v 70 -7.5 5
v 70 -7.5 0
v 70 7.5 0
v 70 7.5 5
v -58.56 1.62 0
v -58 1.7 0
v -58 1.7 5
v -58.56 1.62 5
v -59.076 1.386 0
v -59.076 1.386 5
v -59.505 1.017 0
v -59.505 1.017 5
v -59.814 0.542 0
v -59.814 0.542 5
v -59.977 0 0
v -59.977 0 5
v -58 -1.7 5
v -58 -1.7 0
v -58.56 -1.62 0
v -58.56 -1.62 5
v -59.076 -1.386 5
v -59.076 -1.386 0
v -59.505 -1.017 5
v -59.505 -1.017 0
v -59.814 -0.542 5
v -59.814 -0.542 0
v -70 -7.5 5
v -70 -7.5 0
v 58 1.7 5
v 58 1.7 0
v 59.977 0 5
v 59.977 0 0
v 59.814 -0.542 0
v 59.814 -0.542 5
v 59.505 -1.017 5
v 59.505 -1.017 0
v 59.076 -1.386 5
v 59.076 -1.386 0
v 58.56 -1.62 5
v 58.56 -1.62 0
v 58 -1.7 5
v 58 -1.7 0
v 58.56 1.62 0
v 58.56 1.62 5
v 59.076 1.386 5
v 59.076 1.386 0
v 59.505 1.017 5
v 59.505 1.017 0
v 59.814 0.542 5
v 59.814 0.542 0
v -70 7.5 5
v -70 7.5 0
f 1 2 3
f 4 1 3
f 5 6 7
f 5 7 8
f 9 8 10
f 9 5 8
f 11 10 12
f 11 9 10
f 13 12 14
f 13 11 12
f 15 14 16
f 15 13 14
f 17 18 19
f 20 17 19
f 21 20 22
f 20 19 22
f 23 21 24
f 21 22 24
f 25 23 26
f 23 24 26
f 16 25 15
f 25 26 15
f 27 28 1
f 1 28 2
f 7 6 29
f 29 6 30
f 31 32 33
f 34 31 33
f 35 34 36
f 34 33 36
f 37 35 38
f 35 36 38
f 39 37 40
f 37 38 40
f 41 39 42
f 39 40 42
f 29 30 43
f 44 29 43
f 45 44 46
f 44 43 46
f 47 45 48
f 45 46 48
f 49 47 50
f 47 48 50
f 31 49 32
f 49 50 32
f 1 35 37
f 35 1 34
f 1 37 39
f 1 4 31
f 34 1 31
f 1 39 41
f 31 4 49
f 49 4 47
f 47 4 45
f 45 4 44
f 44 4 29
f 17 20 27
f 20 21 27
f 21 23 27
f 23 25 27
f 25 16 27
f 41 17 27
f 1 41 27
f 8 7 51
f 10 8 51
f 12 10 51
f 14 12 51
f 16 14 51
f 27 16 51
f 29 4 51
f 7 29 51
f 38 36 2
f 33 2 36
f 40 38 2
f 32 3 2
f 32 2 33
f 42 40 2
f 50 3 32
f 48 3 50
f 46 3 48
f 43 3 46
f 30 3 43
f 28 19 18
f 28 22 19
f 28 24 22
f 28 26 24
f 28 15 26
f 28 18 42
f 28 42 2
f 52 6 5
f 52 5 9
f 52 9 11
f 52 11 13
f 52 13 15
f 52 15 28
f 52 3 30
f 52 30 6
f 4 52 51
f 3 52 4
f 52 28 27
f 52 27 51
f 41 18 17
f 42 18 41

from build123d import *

# Parameters (mm, degrees)
F0_W        = 140
F0_H        = 15
F0_W_2      = 120
F0_H_2      = 3.4
F1_DEPTH    = 5
F2_T1_DEPTH = 5


# Not quite as in the source:
# - a fillet or chamfer that OpenCascade refuses, or shapes differently, is made with other operations: its cross-section is extruded or revolved along the edge and cut away or added


with BuildPart() as f1:
    # F0 (on Top) → F1 (new body)
    with BuildSketch(Plane.XY):
        Rectangle(F0_W, F0_H)
        Rectangle(F0_W_2, F0_H_2, mode=Mode.SUBTRACT)
    extrude(amount=F1_DEPTH)

    # F2: fillet of radius 2 on 4 edges, made by hand

    # F2_s2 → F2_t1 (join)
    with BuildSketch(Plane.XY):
        with BuildLine():
            ThreePointArc((-58, 1.7), (-59.4142135624, 1.1142135624), (-60, -0.3))
            Line((-60, -0.3), (-60, 1.7))
            Line((-60, 1.7), (-58, 1.7))
        make_face()
        with BuildLine():
            ThreePointArc((-58, -1.7), (-59.4142135624, -1.1142135624), (-60, 0.3))
            Line((-60, 0.3), (-60, -1.7))
            Line((-60, -1.7), (-58, -1.7))
        make_face()
        with BuildLine():
            ThreePointArc((58, 1.7), (59.4142135624, 1.1142135624), (60, -0.3))
            Line((60, -0.3), (60, 1.7))
            Line((60, 1.7), (58, 1.7))
        make_face()
        with BuildLine():
            ThreePointArc((60, 0.3), (59.4142135624, -1.1142135624), (58, -1.7))
            Line((58, -1.7), (60, -1.7))
            Line((60, -1.7), (60, 0.3))
        make_face()
    extrude(amount=F2_T1_DEPTH)


solid = f1.part
